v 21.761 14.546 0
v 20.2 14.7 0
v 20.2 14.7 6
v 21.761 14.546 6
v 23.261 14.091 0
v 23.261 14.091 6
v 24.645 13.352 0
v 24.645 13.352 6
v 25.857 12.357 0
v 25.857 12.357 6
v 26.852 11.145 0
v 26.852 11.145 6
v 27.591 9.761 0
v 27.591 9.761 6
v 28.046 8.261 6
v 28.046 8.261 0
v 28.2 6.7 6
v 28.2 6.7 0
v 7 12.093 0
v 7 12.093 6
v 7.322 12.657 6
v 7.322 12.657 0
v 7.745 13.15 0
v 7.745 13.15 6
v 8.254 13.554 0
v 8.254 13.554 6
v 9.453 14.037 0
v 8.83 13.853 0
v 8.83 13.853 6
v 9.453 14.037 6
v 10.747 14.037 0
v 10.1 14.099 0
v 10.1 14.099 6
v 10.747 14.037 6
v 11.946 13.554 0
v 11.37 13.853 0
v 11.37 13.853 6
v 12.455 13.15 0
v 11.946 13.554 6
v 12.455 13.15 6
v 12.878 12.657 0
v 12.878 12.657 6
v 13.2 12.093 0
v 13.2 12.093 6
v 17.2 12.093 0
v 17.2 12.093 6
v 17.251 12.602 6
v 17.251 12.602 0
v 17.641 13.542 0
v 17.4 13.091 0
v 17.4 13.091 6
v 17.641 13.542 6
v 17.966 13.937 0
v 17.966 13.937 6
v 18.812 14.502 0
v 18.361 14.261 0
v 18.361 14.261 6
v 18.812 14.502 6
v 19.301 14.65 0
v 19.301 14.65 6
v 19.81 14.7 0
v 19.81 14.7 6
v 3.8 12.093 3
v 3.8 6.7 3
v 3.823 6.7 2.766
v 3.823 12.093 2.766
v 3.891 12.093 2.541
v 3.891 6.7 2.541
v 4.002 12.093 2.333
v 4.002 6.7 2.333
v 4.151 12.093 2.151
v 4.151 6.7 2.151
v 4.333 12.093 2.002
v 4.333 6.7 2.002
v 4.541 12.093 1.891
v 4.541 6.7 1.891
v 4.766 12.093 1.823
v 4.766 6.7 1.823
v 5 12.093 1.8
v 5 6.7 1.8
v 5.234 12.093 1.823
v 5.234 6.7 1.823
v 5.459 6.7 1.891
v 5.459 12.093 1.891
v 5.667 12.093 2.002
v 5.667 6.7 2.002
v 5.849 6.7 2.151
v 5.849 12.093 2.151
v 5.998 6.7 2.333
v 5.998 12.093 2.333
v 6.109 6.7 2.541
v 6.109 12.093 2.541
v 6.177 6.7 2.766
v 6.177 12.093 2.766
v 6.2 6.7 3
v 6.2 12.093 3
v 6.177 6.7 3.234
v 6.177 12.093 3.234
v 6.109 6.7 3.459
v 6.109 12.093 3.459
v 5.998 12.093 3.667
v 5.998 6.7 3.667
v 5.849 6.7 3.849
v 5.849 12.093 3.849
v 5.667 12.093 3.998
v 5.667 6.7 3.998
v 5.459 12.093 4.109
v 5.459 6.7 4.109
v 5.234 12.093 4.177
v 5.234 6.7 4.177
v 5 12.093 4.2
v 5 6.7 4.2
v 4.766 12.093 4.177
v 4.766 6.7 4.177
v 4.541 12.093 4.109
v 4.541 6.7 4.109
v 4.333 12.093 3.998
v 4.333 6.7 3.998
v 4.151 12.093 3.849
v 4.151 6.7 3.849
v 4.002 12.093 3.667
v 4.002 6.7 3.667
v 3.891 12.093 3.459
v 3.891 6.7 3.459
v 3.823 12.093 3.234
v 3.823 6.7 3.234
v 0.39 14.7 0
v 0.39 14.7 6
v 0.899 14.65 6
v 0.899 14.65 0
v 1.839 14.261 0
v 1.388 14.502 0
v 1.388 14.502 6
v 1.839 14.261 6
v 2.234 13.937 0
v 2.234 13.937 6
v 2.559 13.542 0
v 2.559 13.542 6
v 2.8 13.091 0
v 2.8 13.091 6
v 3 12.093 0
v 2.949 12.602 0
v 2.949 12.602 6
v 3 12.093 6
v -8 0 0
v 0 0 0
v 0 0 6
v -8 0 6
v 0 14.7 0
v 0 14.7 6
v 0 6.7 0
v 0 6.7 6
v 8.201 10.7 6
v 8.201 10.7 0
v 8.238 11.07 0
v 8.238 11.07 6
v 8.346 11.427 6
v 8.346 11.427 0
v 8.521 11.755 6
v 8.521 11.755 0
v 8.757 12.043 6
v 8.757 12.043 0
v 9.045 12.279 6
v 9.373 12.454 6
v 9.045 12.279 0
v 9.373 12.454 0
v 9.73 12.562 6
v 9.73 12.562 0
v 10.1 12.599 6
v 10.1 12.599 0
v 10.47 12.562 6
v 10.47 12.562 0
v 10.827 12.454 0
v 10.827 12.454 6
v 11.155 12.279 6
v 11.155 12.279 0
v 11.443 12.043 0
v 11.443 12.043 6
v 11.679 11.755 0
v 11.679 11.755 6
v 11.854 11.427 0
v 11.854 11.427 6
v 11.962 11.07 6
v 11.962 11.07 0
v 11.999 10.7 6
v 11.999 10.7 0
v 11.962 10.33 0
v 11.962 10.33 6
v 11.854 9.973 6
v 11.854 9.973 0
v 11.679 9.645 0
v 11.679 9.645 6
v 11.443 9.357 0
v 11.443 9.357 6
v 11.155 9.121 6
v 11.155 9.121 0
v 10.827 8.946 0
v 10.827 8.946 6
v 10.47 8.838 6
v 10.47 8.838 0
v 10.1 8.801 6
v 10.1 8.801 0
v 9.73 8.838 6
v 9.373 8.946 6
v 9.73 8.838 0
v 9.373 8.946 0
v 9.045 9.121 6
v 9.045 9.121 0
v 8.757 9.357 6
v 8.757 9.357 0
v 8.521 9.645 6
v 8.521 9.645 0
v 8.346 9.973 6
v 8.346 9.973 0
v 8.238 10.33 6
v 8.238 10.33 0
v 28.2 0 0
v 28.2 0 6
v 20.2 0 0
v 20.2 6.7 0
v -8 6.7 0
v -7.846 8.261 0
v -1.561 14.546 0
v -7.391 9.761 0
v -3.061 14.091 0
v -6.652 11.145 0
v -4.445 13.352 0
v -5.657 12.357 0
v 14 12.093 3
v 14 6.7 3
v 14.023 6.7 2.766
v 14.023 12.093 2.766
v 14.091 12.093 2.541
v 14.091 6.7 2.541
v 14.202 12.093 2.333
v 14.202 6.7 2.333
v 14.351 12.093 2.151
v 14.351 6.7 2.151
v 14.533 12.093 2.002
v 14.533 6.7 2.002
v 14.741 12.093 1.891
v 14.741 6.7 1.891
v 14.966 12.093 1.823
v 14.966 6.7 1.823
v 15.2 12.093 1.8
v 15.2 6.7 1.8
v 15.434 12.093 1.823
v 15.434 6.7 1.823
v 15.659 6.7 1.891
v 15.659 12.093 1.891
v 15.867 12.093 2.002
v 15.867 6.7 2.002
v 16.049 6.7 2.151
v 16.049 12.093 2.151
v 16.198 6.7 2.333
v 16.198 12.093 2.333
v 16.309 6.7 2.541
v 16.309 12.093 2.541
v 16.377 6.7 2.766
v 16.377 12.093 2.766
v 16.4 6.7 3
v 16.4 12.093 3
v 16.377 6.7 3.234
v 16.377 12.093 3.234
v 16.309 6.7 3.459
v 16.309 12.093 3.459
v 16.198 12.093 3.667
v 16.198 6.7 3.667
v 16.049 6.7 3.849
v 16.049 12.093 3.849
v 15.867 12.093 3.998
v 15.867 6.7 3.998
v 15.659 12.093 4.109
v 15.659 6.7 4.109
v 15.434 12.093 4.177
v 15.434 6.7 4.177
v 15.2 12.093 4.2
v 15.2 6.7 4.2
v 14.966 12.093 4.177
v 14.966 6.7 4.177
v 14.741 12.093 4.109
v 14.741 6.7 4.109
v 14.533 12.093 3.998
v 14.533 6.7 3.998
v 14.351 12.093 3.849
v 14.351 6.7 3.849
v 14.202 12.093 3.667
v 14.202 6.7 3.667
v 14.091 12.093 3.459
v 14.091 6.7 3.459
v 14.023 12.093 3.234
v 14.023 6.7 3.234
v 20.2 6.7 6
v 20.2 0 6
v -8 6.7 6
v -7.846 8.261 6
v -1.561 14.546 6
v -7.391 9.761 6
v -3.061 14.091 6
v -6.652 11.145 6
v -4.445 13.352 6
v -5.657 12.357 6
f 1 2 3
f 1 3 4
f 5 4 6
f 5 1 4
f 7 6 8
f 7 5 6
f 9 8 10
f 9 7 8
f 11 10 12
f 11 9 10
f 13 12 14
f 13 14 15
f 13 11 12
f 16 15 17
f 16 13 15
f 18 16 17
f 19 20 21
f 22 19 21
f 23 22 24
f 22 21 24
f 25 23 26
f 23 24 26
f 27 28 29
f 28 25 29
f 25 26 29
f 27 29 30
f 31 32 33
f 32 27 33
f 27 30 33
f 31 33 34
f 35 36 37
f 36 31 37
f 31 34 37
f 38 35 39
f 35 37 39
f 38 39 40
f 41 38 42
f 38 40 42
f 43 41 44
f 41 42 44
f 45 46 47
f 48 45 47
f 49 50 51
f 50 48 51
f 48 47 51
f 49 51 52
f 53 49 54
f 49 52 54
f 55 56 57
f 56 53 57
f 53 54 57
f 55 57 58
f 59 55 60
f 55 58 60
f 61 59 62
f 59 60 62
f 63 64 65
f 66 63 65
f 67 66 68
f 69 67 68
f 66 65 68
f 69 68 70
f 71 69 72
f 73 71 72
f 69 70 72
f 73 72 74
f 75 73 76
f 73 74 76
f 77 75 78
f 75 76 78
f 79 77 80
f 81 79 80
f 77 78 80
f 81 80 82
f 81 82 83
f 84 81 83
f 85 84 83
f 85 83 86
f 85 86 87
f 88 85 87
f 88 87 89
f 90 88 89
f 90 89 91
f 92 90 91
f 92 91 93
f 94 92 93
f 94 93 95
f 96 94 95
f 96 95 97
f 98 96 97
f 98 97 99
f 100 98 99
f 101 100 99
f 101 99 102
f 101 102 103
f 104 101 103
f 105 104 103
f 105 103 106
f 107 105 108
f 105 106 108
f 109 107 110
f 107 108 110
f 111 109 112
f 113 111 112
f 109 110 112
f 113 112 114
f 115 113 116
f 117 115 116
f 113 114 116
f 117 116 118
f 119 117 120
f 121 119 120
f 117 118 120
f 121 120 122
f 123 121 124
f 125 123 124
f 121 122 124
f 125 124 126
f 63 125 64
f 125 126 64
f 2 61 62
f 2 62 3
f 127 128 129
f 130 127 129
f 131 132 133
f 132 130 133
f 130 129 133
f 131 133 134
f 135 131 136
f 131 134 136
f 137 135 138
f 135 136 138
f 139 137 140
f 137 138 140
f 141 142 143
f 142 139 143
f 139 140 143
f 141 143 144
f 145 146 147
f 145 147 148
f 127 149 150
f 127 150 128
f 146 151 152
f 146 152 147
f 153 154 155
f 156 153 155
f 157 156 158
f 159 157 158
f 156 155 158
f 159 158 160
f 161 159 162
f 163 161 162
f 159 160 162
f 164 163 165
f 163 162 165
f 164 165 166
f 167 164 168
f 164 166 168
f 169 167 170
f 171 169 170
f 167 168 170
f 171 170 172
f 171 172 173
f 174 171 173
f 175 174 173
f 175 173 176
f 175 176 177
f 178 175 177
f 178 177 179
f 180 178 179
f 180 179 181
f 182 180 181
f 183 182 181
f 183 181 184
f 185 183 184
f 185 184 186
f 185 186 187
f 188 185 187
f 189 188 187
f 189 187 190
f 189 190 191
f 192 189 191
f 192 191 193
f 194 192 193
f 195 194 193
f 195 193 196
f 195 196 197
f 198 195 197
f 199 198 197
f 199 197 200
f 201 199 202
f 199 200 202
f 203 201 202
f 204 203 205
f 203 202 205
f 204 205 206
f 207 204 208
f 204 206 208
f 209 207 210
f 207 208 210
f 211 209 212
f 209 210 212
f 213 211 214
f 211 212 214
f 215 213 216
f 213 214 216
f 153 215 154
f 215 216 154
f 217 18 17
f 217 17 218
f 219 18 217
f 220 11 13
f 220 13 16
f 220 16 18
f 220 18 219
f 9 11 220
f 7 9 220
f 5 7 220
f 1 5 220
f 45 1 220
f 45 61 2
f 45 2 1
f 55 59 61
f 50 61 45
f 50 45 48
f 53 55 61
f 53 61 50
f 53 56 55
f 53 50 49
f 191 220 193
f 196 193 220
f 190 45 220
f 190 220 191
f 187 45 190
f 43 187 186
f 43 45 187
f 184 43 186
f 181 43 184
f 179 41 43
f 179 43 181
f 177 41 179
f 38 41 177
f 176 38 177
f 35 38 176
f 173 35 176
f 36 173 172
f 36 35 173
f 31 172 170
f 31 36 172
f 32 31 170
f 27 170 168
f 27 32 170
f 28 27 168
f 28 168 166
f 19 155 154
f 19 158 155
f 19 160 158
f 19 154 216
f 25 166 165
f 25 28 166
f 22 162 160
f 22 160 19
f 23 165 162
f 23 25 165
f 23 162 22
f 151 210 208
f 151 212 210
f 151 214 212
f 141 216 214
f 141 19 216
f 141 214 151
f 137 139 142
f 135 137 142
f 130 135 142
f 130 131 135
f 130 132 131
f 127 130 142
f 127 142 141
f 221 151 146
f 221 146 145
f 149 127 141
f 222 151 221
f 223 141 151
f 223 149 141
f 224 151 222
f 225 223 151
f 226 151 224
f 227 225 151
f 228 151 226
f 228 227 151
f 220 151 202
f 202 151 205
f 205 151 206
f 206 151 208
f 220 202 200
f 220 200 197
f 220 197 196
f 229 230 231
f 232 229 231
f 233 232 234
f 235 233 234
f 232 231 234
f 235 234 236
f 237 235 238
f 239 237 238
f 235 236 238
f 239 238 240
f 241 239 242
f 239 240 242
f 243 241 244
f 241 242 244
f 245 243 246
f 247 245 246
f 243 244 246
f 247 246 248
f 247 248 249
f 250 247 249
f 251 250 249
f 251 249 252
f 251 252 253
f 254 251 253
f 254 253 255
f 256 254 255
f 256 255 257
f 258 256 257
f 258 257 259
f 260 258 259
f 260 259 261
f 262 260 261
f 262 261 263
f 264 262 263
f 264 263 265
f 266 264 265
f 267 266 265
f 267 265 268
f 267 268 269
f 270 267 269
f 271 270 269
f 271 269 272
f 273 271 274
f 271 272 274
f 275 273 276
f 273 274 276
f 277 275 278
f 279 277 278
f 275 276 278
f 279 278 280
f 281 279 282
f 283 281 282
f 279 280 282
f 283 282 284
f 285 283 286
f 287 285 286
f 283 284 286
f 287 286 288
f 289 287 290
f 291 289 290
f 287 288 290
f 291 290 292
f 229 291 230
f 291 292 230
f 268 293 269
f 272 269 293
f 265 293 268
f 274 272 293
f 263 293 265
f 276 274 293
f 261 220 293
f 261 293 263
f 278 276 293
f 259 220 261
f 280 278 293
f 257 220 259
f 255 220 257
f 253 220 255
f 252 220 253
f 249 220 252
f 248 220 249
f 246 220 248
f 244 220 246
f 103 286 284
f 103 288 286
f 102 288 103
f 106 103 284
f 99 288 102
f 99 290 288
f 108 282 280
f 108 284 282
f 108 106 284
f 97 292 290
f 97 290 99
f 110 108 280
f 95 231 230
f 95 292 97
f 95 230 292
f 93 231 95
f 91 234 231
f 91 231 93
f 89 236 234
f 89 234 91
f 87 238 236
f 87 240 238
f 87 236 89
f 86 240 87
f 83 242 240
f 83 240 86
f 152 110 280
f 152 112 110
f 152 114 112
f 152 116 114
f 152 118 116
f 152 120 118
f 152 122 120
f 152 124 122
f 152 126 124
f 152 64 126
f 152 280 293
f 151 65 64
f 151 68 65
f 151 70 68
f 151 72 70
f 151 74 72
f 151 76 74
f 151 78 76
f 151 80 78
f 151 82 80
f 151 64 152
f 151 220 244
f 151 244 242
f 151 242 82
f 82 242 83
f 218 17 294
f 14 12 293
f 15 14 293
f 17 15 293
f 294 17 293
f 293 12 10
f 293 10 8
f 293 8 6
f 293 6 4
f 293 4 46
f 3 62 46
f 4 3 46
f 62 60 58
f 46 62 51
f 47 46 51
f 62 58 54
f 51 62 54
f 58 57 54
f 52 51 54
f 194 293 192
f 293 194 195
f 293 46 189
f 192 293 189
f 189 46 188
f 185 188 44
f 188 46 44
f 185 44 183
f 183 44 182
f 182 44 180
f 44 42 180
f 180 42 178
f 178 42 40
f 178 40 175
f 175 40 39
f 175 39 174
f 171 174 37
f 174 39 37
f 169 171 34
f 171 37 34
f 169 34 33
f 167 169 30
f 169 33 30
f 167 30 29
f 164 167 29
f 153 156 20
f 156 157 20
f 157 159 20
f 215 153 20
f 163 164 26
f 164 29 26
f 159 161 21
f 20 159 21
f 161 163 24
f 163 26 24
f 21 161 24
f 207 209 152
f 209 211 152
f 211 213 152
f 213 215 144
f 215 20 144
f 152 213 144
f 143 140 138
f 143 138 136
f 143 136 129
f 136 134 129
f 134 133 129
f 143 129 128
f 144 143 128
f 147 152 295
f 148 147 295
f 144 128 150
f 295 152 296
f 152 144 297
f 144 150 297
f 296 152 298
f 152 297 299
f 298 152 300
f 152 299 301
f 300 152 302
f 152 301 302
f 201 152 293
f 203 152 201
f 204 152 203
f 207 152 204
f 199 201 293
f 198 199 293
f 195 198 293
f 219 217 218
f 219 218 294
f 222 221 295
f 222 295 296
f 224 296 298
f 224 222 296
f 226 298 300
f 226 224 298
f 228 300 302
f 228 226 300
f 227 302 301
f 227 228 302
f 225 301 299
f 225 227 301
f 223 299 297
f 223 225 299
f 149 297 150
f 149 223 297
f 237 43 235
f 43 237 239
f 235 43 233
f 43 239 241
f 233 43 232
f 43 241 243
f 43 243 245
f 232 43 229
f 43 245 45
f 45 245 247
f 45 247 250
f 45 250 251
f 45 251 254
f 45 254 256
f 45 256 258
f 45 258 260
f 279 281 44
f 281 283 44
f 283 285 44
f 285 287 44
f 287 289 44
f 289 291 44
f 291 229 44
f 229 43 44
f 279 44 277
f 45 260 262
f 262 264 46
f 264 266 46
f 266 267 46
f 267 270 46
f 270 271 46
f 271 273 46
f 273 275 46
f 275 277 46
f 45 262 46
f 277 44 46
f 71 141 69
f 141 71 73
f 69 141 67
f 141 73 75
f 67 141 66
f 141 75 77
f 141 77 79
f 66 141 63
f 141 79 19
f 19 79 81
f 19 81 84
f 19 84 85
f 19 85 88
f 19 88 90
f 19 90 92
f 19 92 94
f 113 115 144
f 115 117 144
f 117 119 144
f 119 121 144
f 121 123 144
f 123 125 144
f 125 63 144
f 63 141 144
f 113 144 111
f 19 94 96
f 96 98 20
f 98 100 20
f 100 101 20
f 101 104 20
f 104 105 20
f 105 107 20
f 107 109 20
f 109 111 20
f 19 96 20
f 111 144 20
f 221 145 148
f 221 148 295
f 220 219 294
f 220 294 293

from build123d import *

# Parameters (mm, degrees)
BOSS_EXTRUDE1_DEPTH   = 6
F_6_CLEARANCE_HOLE1_D = 3.7973
CUT_EXTRUDE1_REACH    = 34.362
FILLET1_R             = 2.61
M2_CLEARANCE_HOLE1_D  = 2.4


with BuildPart() as part:
    # Sketch1 → Boss-Extrude1 (new body)
    with BuildSketch(Plane.XY):
        with BuildLine():
            ThreePointArc((-8, 6.7), (-5.656854249, 12.356854249), (0, 14.7))
            Line((0, 14.7), (20.2, 14.7))
            ThreePointArc((20.2, 14.7), (25.856854249, 12.356854249), (28.2, 6.7))
            Line((28.2, 6.7), (28.2, 0))
            Line((28.2, 0), (20.2, 0))
            Line((20.2, 0), (20.2, 6.7))
            Line((20.2, 6.7), (0, 6.7))
            Line((0, 6.7), (0, 0))
            Line((0, 0), (-8, 0))
            Line((-8, 0), (-8, 6.7))
        make_face()
    extrude(amount=BOSS_EXTRUDE1_DEPTH)

    # #6 Clearance Hole1 (through all)
    with Locations(Plane.XY.offset(6)):
        with Locations((10.1, 10.7)):
            Hole(F_6_CLEARANCE_HOLE1_D / 2)

    # Sketch5 → Cut-Extrude1 (cut, up to next)
    with BuildSketch(Plane.XY.offset(6), mode=Mode.PRIVATE) as cut_extrude1_sk1:
        with BuildLine():
            Line((7, 14.7), (3, 14.7))
            Line((3, 14.7), (3, 12.093133814))
            Line((3, 12.093133814), (7, 12.093133814))
            ThreePointArc((7, 12.093133814), (10.1, 14.09865), (13.2, 12.093133814))
            Line((13.2, 12.093133814), (17.2, 12.093133814))
            Line((17.2, 12.093133814), (17.2, 14.7))
            Line((17.2, 14.7), (13.2, 14.7))
            Line((13.2, 14.7), (7, 14.7))
        make_face()
    cut_extrude1_tool1 = extrude(cut_extrude1_sk1.sketch, amount=-CUT_EXTRUDE1_REACH, mode=Mode.PRIVATE) & part.part
    add(cut_extrude1_tool1.solids().sort_by_distance((10.1, 14.243023, 6))[0], mode=Mode.SUBTRACT)

    # Fillet1
    # the kernel refuses this fillet: 2.61 mm, written as the material it takes off along each edge
    with BuildSketch(Plane(origin=(17.2, 14.7, 12.524995297), x_dir=(1, 0, 0), z_dir=(0, 0, -1))) as fillet1_piece_1:
        with BuildLine():
            CenterArc((2.609998119, 2.61), FILLET1_R, 180.068794764, 89.931205236)
            Line((0, 2.606866186), (-0.052199962, 2.60680351))
            Line((-0.052199962, 2.60680351), (-0.0522, 0))
            Line((-0.0522, 0), (0, -0.0522))
            Line((0, -0.0522), (2.609998119, -0.0522))
            Line((2.609998119, -0.0522), (2.609998119, 0))
        make_face()
    extrude(amount=19.049990593, mode=Mode.SUBTRACT)
    with BuildSketch(Plane(origin=(3, 14.7, 12.524995297), x_dir=(-1, 0, 0), z_dir=(0, 0, -1))) as fillet1_piece_2:
        with BuildLine():
            CenterArc((2.609998119, -2.61), FILLET1_R, 90, 89.931205236)
            Line((0, -2.606866186), (-0.052199962, -2.60680351))
            Line((-0.052199962, -2.60680351), (-0.0522, 0))
            Line((-0.0522, 0), (0, 0.0522))
            Line((0, 0.0522), (2.609998119, 0.0522))
            Line((2.609998119, 0.0522), (2.609998119, 0))
        make_face()
    extrude(amount=19.049990593, mode=Mode.SUBTRACT)

    # M2 Clearance Hole1 (through all)
    with Locations(Plane(origin=(0, 12.093133814, 0), x_dir=(1, 0, 0), z_dir=(0, 1, 0))):
        with Locations((5, -3), (15.2, -3)):
            Hole(M2_CLEARANCE_HOLE1_D / 2)


solid = part.part
